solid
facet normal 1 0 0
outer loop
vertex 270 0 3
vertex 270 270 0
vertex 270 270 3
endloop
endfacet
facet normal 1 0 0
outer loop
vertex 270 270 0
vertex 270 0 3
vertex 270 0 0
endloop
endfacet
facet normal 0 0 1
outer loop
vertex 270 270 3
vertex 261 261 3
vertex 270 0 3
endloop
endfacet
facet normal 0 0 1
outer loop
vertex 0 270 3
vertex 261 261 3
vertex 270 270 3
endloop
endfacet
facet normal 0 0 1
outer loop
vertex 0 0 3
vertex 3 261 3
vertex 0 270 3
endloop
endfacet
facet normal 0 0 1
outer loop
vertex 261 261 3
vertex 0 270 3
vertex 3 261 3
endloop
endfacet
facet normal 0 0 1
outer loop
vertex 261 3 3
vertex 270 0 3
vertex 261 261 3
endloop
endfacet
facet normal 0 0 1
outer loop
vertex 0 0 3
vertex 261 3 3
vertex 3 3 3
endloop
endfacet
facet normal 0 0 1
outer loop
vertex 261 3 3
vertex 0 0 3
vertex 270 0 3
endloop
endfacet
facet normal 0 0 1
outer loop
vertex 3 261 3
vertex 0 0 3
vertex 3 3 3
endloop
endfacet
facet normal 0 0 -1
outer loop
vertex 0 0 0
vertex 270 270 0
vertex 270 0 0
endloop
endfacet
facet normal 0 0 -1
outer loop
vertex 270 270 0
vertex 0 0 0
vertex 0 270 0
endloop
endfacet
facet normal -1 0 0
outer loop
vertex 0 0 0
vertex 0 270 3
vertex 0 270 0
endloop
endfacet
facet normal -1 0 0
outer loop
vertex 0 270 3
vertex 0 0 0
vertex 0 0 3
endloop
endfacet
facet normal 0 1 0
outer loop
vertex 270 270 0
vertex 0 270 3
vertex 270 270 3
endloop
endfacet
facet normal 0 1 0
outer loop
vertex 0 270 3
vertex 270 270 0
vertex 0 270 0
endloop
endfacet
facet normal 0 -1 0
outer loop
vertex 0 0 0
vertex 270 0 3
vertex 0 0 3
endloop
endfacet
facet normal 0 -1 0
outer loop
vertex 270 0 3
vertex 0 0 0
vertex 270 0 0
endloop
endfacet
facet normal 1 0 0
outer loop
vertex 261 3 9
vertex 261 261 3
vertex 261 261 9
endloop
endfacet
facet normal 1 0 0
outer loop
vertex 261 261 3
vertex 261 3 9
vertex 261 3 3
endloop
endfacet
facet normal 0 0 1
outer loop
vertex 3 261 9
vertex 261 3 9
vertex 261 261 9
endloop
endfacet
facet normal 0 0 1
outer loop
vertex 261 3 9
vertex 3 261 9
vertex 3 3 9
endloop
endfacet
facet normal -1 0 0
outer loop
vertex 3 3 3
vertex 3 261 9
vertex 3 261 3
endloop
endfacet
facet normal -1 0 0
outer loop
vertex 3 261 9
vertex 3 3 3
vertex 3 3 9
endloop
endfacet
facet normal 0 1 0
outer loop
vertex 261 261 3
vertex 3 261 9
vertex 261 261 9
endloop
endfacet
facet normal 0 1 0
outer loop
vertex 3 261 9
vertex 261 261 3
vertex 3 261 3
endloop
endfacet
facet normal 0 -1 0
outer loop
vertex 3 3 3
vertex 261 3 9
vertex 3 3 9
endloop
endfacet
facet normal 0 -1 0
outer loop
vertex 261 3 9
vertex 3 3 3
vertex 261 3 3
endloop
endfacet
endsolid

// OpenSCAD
// file: psu-case-parts.scad
include <psu-dimensions.scad>

module lower_base() {
     cube([total_width,
           total_depth,
           outer_thickness],
          center=false);
}

module upper_base() {
     translate([outer_thickness, outer_thickness]) {
          cube([total_width-2*inner_thickness,
                total_depth-2*inner_thickness,
                inner_thickness],
               center=false);
     }
}

module base() {
     color("red") lower_base();
     color("green") translate([0, 0, outer_thickness]) upper_base();
}

module binding_post_hole_pair(diameter, spacing, join) {
     translate([-spacing/2, 0]) circle(d=diameter);
     translate([spacing/2, 0]) circle(d=diameter);
     if (join) {
         translate([-spacing/2, -diameter/2]) square([spacing, diameter]);
     }
}

module meter_and_switch_cutout() {
    translate([-meter_and_switch_width/2, -meter_and_switch_height/2]) {
        square([switch_width, switch_height]);
        translate([switch_width + meter_switch_gap, (switch_height - meter_height)/2]) {
            square([meter_width, meter_height]);
        }
    }
}
// file: psu-dimensions.scad
total_width = 270;
total_depth = 270;
total_height = 135;

outer_thickness = 3;
inner_thickness = 6;

top_of_lower_base = outer_thickness;
top_of_base = top_of_lower_base + inner_thickness;

margin = 15;
cutting_space = 5;

voltages = ["5V", "3--36V", "12V"];

sections = len(voltages);

section_width = (total_width - 2 * outer_thickness) / 3;

half_section_width = section_width / 2;

inner_depth = total_depth - outer_thickness;

panel_lip_width = 3;
panel_lip_depth = 3;

switch_height = 27.2;
switch_width = 10.4;
switch_depth = 25;               /* TODO: measure this */

meter_width = 48;
meter_height = 29;
meter_depth = 25;               /* TODO: measure this */

rocker_width = switch_width - 3;
rocker_depth = 6;
rocker_height = switch_height - 3;

meter_switch_gap = 12;

meter_and_switch_height = max(meter_height, switch_height);
meter_and_switch_width = meter_width + meter_switch_gap + switch_width;
meter_and_switch_offset_from_base = 45;

mains_inlet_width = 31;
mains_inlet_height = 27;

switch_offset = 30;
meter_offset = 100;

adjuster_width = 79;
adjuster_height = 42;
adjuster_depth = 42;
adjuster_y_offset = meter_and_switch_offset_from_base + meter_and_switch_height + 8;

clamp_connector_length = 20;
clamp_connector_width = 18;
wire_clamp_depth = clamp_connector_length + 15;

binding_post_hole_inner_diameter = 15;
binding_post_hole_outer_diameter = 3;
binding_post_rows = 6;
binding_post_spacing = 20;
binding_post_row_spacing = 25;
binding_post_offset = binding_post_row_spacing + wire_clamp_depth;

ventilation_panel_start = mains_inlet_width + margin * 3;
ventilation_hole_diameter = 10;
ventilation_hole_spacing = ventilation_hole_diameter * 1.5;
rear_ventilation_holes_per_row = (total_width - (ventilation_panel_start + margin * 2)) / ventilation_hole_spacing;
rear_ventilation_hole_rows = (total_height  - (margin * 2)) / ventilation_hole_spacing;
side_ventilation_area_length = total_depth/3;
side_ventilation_holes_per_row = side_ventilation_area_length / ventilation_hole_spacing;
side_ventilation_hole_rows = (total_height  - (margin * 2)) / ventilation_hole_spacing;

/* some internal parts so I can experiment with layout */

psu12v_length = 215;
psu12v_width = 113;
psu12v_height = 49;

psu5v_length = 160;
psu5v_width = 100;
psu5v_height = 42;

psu36v_length = 65;
psu36v_width = 115;
psu36v_height = 40;

/* layout */

gap_around_components = 10;
// main file
include <psu-dimensions.scad>
include <psu-case-parts.scad>

base();
